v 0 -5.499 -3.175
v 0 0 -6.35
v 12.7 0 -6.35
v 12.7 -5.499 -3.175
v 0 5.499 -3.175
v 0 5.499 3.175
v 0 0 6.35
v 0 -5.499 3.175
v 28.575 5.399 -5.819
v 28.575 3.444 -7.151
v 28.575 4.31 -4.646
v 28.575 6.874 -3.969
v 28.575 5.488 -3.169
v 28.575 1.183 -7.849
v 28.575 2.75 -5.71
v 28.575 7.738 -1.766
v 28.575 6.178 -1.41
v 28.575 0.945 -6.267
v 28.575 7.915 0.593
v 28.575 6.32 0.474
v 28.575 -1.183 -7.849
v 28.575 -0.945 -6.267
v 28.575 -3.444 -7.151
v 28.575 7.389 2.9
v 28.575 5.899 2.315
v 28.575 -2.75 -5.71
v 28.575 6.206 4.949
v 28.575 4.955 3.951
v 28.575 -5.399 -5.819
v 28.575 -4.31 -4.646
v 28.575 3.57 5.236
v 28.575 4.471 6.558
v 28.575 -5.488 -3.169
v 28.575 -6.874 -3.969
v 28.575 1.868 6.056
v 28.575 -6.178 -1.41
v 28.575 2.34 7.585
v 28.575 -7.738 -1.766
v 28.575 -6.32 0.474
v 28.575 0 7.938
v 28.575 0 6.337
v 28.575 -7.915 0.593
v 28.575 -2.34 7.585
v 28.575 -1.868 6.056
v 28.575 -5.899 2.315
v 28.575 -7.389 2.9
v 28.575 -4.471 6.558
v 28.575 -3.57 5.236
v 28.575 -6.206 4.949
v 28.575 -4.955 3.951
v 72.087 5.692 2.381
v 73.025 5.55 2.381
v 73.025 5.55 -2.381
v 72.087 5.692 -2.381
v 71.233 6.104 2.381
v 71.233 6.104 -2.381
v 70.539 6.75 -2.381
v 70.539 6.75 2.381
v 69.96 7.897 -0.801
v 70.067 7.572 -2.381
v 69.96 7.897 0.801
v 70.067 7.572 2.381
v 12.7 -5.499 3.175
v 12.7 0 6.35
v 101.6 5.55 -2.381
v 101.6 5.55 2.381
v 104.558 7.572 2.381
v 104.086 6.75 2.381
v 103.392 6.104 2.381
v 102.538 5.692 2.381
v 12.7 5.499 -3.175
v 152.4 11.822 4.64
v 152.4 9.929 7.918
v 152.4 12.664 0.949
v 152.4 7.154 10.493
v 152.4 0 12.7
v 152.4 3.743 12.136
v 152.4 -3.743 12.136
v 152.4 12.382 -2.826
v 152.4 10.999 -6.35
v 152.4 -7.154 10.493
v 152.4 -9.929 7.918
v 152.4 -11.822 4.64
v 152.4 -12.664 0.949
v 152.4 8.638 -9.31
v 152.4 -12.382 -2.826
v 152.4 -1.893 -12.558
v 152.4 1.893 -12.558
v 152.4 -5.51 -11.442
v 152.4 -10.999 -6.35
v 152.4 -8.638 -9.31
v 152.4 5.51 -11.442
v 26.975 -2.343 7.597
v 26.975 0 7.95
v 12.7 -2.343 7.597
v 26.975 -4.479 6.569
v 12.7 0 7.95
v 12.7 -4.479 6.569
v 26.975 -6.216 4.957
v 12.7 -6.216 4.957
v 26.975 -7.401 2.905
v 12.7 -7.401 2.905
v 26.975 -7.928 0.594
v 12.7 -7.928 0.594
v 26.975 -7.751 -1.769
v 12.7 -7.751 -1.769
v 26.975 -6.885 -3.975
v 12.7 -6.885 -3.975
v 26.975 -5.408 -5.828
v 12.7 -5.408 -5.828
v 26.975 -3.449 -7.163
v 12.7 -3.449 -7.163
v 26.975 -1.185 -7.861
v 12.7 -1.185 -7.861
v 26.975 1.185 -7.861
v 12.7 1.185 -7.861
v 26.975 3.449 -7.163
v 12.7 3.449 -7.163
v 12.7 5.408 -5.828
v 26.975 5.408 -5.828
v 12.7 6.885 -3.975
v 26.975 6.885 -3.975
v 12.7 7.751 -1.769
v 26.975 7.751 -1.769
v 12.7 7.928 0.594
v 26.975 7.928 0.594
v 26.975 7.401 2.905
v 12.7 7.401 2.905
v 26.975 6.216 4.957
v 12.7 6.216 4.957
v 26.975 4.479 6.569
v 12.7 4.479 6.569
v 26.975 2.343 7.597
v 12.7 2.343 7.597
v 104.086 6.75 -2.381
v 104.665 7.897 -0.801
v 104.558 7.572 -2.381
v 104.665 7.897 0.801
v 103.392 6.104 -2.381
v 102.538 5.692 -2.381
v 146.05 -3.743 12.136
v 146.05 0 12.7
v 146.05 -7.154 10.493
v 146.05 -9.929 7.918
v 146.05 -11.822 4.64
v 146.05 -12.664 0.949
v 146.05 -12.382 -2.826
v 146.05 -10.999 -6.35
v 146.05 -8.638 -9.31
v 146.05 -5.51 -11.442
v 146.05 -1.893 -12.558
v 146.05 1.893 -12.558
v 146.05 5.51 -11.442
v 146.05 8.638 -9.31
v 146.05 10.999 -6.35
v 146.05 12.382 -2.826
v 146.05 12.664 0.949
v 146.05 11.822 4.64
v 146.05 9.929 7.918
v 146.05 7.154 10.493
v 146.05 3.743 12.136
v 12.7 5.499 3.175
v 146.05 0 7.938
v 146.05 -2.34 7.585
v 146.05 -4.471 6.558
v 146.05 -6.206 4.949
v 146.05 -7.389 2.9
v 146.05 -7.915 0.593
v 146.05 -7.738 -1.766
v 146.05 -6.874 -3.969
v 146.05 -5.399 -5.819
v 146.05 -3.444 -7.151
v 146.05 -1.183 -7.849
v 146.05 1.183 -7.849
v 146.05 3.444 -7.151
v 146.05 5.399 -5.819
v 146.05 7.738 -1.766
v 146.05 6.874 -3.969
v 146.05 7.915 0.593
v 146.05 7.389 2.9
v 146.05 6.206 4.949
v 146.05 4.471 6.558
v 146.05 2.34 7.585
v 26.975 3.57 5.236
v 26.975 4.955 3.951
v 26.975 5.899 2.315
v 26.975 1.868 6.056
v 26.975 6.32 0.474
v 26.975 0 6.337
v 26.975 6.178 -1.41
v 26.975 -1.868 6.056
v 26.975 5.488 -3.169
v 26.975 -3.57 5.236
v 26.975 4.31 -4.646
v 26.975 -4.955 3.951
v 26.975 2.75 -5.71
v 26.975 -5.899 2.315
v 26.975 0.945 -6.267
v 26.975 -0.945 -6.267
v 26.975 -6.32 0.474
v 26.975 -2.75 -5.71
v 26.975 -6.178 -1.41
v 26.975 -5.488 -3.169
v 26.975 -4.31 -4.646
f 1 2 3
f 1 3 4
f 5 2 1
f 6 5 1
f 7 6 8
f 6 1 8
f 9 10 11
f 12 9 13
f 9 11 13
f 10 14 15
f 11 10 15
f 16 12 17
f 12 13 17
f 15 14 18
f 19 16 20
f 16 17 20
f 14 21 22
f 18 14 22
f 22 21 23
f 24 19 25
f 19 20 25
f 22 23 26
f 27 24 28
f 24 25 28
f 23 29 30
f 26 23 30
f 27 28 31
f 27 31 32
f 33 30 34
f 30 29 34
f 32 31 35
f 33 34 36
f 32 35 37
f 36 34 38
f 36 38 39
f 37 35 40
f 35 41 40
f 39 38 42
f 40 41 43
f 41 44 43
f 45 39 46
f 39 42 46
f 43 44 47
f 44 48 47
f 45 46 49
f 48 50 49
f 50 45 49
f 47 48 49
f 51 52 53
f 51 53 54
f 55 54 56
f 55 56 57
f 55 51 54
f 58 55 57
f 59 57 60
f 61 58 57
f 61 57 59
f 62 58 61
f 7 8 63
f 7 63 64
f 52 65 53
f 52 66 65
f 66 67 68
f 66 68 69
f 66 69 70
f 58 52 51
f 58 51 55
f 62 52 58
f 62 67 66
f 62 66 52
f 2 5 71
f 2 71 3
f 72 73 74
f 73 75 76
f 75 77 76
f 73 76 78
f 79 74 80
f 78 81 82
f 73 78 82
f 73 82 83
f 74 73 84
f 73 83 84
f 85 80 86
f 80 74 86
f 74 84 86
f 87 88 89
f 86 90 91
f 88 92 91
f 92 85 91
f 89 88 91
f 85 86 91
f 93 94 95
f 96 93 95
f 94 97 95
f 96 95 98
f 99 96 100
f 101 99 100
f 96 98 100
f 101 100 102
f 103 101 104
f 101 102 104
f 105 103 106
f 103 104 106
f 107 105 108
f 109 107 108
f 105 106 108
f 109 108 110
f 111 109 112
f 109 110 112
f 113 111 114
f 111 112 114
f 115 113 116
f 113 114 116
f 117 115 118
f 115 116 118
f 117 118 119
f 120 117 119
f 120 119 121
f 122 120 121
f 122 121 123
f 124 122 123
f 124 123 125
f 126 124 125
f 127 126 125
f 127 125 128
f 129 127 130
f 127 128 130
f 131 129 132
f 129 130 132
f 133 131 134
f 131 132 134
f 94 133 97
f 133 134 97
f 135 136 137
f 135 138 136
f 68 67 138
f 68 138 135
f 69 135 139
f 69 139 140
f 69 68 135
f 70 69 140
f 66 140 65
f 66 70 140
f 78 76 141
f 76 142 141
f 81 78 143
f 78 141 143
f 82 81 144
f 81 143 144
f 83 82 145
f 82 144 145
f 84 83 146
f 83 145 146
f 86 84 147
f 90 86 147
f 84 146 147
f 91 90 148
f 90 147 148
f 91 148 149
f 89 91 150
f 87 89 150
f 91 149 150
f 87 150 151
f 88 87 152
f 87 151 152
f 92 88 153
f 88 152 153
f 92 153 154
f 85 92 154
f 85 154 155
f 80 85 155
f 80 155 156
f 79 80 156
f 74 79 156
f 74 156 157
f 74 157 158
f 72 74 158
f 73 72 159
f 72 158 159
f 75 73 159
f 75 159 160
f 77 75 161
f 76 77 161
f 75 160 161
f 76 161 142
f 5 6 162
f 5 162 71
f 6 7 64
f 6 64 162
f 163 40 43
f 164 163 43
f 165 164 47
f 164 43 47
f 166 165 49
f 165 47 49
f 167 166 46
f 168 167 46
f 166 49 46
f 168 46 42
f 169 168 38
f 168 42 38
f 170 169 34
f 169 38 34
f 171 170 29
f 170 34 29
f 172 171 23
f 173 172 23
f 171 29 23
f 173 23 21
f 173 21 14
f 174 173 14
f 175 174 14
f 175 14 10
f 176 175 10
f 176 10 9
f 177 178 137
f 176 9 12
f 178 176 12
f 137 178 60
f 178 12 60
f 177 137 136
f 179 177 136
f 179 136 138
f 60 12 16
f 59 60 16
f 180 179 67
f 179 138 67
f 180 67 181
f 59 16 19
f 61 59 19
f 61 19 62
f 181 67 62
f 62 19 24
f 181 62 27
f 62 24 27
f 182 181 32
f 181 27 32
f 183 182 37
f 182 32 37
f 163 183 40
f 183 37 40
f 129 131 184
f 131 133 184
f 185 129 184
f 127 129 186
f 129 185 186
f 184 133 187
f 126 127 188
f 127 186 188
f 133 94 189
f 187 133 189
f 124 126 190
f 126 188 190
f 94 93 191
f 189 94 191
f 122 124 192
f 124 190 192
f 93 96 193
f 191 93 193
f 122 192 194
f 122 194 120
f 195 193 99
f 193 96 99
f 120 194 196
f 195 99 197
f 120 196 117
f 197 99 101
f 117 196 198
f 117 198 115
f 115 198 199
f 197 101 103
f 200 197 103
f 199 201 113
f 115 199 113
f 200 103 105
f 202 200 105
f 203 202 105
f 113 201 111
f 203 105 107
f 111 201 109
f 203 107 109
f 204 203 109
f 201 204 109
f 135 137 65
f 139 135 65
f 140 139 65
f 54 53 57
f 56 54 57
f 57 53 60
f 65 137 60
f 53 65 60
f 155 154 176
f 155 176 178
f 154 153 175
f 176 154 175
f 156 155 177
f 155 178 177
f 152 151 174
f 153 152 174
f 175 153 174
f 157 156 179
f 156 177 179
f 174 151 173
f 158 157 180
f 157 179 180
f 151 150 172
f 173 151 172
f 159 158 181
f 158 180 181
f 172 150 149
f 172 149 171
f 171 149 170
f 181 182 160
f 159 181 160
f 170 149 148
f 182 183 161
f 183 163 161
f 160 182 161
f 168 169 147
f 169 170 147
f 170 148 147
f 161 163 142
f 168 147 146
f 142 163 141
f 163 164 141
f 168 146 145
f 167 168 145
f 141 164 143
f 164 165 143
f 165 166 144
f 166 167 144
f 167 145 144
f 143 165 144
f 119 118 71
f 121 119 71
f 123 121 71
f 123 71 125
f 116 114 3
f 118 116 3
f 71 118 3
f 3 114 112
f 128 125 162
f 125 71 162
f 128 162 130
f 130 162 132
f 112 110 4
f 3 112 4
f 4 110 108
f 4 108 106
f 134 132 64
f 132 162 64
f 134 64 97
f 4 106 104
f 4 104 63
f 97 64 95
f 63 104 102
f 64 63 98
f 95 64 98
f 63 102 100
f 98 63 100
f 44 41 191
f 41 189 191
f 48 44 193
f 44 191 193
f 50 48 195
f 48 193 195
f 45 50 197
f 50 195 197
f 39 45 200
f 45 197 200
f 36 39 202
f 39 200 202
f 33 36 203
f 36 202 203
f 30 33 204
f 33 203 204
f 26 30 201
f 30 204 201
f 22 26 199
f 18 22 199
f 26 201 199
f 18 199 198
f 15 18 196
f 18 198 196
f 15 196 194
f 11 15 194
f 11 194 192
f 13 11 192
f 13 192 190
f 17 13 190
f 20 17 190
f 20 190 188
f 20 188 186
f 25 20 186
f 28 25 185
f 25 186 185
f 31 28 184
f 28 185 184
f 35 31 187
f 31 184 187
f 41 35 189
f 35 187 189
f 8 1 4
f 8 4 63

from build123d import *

# Parameters (mm, degrees)
KEYWAY_DEPTH               = 2.38125
HEXAGONAL_SKETCH_OUTSIDE_W = 58.716
HEXAGONAL_SKETCH_OUTSIDE_H = 58.716
HEXAGONAL_CUT_DEPTH        = 12.7


with BuildPart() as part:
    # Base Sketch → Base (revolve)
    with BuildSketch(Plane.XY, mode=Mode.PRIVATE) as base_sk:
        Polygon((0, 0), (152.4, 0), (152.4, 12.7), (146.05, 12.7), (146.05, 7.9375), (28.575, 7.9375), (28.575, 6.3373), (26.9748, 6.3373), (26.9748, 7.9502), (12.7, 7.9502), (12.7, 6.35), (0, 6.35), align=None)
    revolve(base_sk.sketch.rotate(Axis((-28.230722892, 0, 0), (1, 0, 0)), 90), axis=Axis((-28.230722892, 0, 0), (1, 0, 0)))

    # Keyway Sketch → Keyway (cut, symmetric)
    with BuildSketch(Plane.XY):
        with BuildLine():
            Line((69.85, 14.2875), (104.775, 14.2875))
            Line((104.775, 14.2875), (104.775, 8.7249))
            ThreePointArc((104.775, 8.7249), (103.84506403, 6.47983597), (101.6, 5.5499))
            Line((101.6, 5.5499), (73.025, 5.5499))
            ThreePointArc((73.025, 5.5499), (70.77993597, 6.47983597), (69.85, 8.7249))
            Line((69.85, 8.7249), (69.85, 14.2875))
        make_face()
    extrude(amount=KEYWAY_DEPTH, both=True, mode=Mode.SUBTRACT)

    # Hexagonal Sketch outside → Hexagonal Cut (cut)
    with BuildSketch(Plane.ZY):
        Rectangle(HEXAGONAL_SKETCH_OUTSIDE_W, HEXAGONAL_SKETCH_OUTSIDE_H)
        Polygon((3.175, 5.499261314), (-3.175, 5.499261314), (-6.35, 0), (-3.175, -5.499261314), (3.175, -5.499261314), (6.35, 0), align=None, mode=Mode.SUBTRACT)
    extrude(amount=-HEXAGONAL_CUT_DEPTH, mode=Mode.SUBTRACT)


solid = part.part
